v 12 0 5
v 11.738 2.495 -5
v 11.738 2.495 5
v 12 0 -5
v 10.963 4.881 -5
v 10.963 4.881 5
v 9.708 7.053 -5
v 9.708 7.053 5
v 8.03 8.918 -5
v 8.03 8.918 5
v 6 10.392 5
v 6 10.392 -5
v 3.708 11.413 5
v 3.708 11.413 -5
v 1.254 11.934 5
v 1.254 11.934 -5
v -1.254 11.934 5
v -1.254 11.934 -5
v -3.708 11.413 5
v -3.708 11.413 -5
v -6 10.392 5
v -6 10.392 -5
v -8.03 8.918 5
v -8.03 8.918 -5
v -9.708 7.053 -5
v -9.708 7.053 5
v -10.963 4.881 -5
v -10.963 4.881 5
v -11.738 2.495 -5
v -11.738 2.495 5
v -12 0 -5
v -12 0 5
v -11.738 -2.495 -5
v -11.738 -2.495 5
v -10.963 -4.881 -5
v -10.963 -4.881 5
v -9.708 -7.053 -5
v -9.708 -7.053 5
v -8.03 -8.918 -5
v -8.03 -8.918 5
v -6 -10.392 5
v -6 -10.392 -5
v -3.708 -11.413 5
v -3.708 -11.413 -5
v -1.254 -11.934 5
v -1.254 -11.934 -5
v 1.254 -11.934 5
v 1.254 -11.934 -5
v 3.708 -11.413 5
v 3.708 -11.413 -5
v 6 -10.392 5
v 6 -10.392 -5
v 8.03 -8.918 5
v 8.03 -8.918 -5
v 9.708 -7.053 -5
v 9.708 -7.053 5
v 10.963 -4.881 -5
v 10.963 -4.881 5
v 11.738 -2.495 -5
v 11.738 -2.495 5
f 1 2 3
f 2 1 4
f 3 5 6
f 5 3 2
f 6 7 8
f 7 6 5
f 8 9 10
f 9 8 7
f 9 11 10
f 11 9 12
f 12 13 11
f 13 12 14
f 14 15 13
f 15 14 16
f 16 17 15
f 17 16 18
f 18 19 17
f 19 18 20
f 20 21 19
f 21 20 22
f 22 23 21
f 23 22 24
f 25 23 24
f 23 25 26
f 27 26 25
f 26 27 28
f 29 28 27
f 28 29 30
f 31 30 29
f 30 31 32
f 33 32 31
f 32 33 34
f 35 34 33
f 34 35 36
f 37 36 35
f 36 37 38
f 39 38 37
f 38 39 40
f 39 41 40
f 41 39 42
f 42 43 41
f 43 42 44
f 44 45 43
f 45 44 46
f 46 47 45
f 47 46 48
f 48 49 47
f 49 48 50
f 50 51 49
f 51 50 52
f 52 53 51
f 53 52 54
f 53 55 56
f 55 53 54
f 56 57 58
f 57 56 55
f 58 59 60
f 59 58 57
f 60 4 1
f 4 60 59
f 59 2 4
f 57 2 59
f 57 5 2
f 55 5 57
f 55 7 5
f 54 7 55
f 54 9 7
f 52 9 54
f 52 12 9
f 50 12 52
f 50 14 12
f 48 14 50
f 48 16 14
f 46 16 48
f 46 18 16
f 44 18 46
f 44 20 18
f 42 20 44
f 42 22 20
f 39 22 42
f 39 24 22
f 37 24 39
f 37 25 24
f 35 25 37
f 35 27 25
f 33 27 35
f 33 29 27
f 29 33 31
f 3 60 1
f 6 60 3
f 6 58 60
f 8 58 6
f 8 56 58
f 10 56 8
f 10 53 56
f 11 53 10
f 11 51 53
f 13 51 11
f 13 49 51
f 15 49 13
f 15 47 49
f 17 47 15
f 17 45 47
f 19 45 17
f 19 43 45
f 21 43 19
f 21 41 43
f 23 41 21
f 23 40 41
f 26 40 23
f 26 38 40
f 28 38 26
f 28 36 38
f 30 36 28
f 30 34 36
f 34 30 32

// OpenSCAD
// Generated by generate_scads.py
cylinder(h=10, r=12, center=true);
